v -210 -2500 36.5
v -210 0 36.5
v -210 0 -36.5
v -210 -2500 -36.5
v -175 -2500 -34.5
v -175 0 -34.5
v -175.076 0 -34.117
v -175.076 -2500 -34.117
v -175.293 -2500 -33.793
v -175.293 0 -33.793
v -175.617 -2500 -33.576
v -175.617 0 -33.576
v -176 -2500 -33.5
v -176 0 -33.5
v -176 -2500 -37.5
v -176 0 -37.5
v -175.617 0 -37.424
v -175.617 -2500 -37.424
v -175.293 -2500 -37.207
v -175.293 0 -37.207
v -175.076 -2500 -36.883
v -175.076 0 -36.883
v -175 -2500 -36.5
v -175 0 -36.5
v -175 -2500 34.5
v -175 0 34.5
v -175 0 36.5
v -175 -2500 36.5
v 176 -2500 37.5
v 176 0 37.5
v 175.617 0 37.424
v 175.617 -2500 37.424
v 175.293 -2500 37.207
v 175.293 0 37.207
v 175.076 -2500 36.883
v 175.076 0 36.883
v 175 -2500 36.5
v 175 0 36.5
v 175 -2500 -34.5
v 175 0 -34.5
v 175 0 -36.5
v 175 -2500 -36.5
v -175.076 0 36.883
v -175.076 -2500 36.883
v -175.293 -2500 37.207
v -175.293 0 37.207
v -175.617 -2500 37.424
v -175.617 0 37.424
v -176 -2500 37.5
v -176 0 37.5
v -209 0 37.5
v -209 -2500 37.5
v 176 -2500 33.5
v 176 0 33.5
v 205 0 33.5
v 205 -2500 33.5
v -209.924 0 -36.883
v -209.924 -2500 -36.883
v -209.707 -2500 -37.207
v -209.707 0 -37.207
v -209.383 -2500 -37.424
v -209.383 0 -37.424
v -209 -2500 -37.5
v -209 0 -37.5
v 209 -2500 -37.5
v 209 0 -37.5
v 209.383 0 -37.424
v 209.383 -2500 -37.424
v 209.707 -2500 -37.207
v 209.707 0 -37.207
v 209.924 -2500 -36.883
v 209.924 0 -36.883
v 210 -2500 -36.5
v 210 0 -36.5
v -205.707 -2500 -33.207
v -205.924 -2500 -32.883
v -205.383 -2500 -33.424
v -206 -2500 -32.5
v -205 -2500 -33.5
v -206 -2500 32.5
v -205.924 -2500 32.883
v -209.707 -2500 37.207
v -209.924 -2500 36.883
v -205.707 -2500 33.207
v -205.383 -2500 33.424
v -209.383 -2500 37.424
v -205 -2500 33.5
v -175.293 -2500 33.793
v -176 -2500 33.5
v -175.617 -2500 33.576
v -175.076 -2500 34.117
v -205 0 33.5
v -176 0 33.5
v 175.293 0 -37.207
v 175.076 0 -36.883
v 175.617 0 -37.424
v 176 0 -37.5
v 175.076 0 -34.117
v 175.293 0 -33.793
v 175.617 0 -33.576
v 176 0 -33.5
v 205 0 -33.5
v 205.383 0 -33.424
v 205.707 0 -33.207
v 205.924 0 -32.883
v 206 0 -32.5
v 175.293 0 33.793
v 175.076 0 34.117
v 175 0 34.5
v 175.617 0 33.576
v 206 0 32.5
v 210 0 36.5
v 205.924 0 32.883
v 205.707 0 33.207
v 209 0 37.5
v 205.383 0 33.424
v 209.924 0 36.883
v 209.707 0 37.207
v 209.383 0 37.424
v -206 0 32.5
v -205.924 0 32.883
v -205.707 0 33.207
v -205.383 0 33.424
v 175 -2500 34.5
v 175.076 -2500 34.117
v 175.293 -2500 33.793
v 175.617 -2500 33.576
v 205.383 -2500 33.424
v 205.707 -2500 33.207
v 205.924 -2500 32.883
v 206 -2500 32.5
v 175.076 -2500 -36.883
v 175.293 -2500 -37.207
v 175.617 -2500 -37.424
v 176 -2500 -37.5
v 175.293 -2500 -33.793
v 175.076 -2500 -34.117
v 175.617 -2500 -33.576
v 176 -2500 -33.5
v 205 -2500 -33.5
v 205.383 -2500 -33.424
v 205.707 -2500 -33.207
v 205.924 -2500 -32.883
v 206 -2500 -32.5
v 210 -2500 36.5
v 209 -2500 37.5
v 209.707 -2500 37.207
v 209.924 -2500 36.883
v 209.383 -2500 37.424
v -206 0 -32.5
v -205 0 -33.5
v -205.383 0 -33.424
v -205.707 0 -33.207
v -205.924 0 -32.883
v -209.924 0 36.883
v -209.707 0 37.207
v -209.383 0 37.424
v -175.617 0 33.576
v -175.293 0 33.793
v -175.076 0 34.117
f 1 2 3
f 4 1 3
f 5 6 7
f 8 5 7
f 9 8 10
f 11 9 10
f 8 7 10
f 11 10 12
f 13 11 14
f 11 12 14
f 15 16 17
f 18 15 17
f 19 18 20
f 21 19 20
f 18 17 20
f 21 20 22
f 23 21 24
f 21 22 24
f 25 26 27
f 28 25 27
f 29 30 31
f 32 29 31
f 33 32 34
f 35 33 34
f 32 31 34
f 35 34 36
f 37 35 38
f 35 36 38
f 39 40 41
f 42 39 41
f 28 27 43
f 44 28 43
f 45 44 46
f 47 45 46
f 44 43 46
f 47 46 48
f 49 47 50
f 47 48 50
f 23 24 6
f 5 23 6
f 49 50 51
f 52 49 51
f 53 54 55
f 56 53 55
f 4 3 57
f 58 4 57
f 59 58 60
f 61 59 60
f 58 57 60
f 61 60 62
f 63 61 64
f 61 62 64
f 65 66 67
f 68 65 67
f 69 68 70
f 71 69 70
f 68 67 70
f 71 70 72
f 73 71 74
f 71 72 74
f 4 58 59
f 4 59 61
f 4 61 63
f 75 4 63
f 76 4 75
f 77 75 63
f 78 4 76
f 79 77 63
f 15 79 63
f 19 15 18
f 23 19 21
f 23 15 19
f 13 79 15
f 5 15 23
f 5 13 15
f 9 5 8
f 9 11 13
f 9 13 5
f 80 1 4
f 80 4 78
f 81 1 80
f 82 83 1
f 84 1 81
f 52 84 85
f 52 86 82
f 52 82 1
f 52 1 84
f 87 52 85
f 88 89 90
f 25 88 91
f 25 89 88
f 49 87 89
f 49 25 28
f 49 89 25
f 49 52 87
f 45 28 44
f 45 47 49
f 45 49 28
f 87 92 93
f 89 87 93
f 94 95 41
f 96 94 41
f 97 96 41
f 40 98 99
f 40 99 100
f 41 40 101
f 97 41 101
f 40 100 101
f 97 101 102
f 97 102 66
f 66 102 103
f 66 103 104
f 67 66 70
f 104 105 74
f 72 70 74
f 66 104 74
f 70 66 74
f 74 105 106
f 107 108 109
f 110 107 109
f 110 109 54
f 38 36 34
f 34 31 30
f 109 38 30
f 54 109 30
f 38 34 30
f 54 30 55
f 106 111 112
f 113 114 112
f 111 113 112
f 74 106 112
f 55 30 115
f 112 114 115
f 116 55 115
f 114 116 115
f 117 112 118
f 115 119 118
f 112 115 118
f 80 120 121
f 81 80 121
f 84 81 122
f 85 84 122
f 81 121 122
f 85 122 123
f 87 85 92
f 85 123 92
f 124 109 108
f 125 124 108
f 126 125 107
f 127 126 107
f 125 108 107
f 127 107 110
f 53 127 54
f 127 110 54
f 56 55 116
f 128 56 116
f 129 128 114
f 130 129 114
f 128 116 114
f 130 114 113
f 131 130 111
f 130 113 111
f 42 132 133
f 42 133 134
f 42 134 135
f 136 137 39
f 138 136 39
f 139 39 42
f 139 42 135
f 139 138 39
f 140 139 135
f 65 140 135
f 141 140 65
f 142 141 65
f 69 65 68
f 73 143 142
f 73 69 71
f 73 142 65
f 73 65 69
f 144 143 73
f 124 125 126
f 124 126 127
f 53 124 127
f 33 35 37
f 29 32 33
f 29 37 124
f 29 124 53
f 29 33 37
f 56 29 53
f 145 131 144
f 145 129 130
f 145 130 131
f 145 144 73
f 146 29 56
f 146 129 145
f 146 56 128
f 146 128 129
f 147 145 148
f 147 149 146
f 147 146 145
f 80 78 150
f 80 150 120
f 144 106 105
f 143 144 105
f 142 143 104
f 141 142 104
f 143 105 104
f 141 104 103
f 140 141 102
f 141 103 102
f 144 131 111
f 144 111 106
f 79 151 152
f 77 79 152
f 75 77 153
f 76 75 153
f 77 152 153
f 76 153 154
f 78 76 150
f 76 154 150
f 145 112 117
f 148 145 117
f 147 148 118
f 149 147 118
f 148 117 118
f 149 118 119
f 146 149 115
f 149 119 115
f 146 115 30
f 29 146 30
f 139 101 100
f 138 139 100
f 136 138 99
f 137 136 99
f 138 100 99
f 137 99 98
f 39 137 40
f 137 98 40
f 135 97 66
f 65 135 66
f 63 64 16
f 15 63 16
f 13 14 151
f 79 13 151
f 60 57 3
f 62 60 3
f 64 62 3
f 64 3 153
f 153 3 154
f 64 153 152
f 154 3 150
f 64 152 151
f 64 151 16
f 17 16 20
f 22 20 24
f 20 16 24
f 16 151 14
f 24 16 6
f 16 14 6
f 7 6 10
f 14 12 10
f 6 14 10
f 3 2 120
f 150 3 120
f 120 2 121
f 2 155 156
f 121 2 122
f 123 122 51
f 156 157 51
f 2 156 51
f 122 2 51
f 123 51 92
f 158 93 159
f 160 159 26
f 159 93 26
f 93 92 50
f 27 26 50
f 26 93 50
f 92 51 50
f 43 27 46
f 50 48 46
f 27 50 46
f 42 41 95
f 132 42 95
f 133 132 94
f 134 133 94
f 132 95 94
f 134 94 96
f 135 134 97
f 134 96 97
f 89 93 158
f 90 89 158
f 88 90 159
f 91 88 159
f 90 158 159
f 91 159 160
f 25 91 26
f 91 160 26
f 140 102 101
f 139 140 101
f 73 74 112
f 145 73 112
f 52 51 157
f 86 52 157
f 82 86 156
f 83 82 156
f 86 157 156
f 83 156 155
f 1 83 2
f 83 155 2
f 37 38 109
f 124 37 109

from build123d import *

# Parameters (mm, degrees)
F1_DEPTH = 2500


with BuildPart() as f1:
    # F0 (on Front) → F1 (new body)
    with BuildSketch(Plane.XZ):
        with BuildLine():
            ThreePointArc((-206, 32.5), (-205.707107, 33.207107), (-205, 33.5))
            Line((-205, 33.5), (-176, 33.5))
            ThreePointArc((-176, 33.5), (-175.292893, 33.792893), (-175, 34.5))
            Line((-175, 34.5), (-175, 36.5))
            ThreePointArc((-175, 36.5), (-175.292893, 37.207107), (-176, 37.5))
            Line((-176, 37.5), (-209, 37.5))
            ThreePointArc((-209, 37.5), (-209.707107, 37.207107), (-210, 36.5))
            Line((-210, 36.5), (-210, -36.5))
            ThreePointArc((-210, -36.5), (-209.707107, -37.207107), (-209, -37.5))
            Line((-209, -37.5), (-176, -37.5))
            ThreePointArc((-176, -37.5), (-175.292893, -37.207107), (-175, -36.5))
            Line((-175, -36.5), (-175, -34.5))
            ThreePointArc((-175, -34.5), (-175.292893, -33.792893), (-176, -33.5))
            Line((-176, -33.5), (-205, -33.5))
            ThreePointArc((-205, -33.5), (-205.707107, -33.207107), (-206, -32.5))
            Line((-206, -32.5), (-206, 32.5))
        make_face()
        with BuildLine():
            Line((206, 32.5), (206, -32.5))
            ThreePointArc((206, -32.5), (205.707107, -33.207107), (205, -33.5))
            Line((205, -33.5), (176, -33.5))
            ThreePointArc((176, -33.5), (175.292893, -33.792893), (175, -34.5))
            Line((175, -34.5), (175, -36.5))
            ThreePointArc((175, -36.5), (175.292893, -37.207107), (176, -37.5))
            Line((176, -37.5), (209, -37.5))
            ThreePointArc((209, -37.5), (209.707107, -37.207107), (210, -36.5))
            Line((210, -36.5), (210, 36.5))
            ThreePointArc((210, 36.5), (209.707107, 37.207107), (209, 37.5))
            Line((209, 37.5), (176, 37.5))
            ThreePointArc((176, 37.5), (175.292893, 37.207107), (175, 36.5))
            Line((175, 36.5), (175, 34.5))
            ThreePointArc((175, 34.5), (175.292893, 33.792893), (176, 33.5))
            Line((176, 33.5), (205, 33.5))
            ThreePointArc((205, 33.5), (205.707107, 33.207107), (206, 32.5))
        make_face()
    extrude(amount=F1_DEPTH)


solid = f1.part
